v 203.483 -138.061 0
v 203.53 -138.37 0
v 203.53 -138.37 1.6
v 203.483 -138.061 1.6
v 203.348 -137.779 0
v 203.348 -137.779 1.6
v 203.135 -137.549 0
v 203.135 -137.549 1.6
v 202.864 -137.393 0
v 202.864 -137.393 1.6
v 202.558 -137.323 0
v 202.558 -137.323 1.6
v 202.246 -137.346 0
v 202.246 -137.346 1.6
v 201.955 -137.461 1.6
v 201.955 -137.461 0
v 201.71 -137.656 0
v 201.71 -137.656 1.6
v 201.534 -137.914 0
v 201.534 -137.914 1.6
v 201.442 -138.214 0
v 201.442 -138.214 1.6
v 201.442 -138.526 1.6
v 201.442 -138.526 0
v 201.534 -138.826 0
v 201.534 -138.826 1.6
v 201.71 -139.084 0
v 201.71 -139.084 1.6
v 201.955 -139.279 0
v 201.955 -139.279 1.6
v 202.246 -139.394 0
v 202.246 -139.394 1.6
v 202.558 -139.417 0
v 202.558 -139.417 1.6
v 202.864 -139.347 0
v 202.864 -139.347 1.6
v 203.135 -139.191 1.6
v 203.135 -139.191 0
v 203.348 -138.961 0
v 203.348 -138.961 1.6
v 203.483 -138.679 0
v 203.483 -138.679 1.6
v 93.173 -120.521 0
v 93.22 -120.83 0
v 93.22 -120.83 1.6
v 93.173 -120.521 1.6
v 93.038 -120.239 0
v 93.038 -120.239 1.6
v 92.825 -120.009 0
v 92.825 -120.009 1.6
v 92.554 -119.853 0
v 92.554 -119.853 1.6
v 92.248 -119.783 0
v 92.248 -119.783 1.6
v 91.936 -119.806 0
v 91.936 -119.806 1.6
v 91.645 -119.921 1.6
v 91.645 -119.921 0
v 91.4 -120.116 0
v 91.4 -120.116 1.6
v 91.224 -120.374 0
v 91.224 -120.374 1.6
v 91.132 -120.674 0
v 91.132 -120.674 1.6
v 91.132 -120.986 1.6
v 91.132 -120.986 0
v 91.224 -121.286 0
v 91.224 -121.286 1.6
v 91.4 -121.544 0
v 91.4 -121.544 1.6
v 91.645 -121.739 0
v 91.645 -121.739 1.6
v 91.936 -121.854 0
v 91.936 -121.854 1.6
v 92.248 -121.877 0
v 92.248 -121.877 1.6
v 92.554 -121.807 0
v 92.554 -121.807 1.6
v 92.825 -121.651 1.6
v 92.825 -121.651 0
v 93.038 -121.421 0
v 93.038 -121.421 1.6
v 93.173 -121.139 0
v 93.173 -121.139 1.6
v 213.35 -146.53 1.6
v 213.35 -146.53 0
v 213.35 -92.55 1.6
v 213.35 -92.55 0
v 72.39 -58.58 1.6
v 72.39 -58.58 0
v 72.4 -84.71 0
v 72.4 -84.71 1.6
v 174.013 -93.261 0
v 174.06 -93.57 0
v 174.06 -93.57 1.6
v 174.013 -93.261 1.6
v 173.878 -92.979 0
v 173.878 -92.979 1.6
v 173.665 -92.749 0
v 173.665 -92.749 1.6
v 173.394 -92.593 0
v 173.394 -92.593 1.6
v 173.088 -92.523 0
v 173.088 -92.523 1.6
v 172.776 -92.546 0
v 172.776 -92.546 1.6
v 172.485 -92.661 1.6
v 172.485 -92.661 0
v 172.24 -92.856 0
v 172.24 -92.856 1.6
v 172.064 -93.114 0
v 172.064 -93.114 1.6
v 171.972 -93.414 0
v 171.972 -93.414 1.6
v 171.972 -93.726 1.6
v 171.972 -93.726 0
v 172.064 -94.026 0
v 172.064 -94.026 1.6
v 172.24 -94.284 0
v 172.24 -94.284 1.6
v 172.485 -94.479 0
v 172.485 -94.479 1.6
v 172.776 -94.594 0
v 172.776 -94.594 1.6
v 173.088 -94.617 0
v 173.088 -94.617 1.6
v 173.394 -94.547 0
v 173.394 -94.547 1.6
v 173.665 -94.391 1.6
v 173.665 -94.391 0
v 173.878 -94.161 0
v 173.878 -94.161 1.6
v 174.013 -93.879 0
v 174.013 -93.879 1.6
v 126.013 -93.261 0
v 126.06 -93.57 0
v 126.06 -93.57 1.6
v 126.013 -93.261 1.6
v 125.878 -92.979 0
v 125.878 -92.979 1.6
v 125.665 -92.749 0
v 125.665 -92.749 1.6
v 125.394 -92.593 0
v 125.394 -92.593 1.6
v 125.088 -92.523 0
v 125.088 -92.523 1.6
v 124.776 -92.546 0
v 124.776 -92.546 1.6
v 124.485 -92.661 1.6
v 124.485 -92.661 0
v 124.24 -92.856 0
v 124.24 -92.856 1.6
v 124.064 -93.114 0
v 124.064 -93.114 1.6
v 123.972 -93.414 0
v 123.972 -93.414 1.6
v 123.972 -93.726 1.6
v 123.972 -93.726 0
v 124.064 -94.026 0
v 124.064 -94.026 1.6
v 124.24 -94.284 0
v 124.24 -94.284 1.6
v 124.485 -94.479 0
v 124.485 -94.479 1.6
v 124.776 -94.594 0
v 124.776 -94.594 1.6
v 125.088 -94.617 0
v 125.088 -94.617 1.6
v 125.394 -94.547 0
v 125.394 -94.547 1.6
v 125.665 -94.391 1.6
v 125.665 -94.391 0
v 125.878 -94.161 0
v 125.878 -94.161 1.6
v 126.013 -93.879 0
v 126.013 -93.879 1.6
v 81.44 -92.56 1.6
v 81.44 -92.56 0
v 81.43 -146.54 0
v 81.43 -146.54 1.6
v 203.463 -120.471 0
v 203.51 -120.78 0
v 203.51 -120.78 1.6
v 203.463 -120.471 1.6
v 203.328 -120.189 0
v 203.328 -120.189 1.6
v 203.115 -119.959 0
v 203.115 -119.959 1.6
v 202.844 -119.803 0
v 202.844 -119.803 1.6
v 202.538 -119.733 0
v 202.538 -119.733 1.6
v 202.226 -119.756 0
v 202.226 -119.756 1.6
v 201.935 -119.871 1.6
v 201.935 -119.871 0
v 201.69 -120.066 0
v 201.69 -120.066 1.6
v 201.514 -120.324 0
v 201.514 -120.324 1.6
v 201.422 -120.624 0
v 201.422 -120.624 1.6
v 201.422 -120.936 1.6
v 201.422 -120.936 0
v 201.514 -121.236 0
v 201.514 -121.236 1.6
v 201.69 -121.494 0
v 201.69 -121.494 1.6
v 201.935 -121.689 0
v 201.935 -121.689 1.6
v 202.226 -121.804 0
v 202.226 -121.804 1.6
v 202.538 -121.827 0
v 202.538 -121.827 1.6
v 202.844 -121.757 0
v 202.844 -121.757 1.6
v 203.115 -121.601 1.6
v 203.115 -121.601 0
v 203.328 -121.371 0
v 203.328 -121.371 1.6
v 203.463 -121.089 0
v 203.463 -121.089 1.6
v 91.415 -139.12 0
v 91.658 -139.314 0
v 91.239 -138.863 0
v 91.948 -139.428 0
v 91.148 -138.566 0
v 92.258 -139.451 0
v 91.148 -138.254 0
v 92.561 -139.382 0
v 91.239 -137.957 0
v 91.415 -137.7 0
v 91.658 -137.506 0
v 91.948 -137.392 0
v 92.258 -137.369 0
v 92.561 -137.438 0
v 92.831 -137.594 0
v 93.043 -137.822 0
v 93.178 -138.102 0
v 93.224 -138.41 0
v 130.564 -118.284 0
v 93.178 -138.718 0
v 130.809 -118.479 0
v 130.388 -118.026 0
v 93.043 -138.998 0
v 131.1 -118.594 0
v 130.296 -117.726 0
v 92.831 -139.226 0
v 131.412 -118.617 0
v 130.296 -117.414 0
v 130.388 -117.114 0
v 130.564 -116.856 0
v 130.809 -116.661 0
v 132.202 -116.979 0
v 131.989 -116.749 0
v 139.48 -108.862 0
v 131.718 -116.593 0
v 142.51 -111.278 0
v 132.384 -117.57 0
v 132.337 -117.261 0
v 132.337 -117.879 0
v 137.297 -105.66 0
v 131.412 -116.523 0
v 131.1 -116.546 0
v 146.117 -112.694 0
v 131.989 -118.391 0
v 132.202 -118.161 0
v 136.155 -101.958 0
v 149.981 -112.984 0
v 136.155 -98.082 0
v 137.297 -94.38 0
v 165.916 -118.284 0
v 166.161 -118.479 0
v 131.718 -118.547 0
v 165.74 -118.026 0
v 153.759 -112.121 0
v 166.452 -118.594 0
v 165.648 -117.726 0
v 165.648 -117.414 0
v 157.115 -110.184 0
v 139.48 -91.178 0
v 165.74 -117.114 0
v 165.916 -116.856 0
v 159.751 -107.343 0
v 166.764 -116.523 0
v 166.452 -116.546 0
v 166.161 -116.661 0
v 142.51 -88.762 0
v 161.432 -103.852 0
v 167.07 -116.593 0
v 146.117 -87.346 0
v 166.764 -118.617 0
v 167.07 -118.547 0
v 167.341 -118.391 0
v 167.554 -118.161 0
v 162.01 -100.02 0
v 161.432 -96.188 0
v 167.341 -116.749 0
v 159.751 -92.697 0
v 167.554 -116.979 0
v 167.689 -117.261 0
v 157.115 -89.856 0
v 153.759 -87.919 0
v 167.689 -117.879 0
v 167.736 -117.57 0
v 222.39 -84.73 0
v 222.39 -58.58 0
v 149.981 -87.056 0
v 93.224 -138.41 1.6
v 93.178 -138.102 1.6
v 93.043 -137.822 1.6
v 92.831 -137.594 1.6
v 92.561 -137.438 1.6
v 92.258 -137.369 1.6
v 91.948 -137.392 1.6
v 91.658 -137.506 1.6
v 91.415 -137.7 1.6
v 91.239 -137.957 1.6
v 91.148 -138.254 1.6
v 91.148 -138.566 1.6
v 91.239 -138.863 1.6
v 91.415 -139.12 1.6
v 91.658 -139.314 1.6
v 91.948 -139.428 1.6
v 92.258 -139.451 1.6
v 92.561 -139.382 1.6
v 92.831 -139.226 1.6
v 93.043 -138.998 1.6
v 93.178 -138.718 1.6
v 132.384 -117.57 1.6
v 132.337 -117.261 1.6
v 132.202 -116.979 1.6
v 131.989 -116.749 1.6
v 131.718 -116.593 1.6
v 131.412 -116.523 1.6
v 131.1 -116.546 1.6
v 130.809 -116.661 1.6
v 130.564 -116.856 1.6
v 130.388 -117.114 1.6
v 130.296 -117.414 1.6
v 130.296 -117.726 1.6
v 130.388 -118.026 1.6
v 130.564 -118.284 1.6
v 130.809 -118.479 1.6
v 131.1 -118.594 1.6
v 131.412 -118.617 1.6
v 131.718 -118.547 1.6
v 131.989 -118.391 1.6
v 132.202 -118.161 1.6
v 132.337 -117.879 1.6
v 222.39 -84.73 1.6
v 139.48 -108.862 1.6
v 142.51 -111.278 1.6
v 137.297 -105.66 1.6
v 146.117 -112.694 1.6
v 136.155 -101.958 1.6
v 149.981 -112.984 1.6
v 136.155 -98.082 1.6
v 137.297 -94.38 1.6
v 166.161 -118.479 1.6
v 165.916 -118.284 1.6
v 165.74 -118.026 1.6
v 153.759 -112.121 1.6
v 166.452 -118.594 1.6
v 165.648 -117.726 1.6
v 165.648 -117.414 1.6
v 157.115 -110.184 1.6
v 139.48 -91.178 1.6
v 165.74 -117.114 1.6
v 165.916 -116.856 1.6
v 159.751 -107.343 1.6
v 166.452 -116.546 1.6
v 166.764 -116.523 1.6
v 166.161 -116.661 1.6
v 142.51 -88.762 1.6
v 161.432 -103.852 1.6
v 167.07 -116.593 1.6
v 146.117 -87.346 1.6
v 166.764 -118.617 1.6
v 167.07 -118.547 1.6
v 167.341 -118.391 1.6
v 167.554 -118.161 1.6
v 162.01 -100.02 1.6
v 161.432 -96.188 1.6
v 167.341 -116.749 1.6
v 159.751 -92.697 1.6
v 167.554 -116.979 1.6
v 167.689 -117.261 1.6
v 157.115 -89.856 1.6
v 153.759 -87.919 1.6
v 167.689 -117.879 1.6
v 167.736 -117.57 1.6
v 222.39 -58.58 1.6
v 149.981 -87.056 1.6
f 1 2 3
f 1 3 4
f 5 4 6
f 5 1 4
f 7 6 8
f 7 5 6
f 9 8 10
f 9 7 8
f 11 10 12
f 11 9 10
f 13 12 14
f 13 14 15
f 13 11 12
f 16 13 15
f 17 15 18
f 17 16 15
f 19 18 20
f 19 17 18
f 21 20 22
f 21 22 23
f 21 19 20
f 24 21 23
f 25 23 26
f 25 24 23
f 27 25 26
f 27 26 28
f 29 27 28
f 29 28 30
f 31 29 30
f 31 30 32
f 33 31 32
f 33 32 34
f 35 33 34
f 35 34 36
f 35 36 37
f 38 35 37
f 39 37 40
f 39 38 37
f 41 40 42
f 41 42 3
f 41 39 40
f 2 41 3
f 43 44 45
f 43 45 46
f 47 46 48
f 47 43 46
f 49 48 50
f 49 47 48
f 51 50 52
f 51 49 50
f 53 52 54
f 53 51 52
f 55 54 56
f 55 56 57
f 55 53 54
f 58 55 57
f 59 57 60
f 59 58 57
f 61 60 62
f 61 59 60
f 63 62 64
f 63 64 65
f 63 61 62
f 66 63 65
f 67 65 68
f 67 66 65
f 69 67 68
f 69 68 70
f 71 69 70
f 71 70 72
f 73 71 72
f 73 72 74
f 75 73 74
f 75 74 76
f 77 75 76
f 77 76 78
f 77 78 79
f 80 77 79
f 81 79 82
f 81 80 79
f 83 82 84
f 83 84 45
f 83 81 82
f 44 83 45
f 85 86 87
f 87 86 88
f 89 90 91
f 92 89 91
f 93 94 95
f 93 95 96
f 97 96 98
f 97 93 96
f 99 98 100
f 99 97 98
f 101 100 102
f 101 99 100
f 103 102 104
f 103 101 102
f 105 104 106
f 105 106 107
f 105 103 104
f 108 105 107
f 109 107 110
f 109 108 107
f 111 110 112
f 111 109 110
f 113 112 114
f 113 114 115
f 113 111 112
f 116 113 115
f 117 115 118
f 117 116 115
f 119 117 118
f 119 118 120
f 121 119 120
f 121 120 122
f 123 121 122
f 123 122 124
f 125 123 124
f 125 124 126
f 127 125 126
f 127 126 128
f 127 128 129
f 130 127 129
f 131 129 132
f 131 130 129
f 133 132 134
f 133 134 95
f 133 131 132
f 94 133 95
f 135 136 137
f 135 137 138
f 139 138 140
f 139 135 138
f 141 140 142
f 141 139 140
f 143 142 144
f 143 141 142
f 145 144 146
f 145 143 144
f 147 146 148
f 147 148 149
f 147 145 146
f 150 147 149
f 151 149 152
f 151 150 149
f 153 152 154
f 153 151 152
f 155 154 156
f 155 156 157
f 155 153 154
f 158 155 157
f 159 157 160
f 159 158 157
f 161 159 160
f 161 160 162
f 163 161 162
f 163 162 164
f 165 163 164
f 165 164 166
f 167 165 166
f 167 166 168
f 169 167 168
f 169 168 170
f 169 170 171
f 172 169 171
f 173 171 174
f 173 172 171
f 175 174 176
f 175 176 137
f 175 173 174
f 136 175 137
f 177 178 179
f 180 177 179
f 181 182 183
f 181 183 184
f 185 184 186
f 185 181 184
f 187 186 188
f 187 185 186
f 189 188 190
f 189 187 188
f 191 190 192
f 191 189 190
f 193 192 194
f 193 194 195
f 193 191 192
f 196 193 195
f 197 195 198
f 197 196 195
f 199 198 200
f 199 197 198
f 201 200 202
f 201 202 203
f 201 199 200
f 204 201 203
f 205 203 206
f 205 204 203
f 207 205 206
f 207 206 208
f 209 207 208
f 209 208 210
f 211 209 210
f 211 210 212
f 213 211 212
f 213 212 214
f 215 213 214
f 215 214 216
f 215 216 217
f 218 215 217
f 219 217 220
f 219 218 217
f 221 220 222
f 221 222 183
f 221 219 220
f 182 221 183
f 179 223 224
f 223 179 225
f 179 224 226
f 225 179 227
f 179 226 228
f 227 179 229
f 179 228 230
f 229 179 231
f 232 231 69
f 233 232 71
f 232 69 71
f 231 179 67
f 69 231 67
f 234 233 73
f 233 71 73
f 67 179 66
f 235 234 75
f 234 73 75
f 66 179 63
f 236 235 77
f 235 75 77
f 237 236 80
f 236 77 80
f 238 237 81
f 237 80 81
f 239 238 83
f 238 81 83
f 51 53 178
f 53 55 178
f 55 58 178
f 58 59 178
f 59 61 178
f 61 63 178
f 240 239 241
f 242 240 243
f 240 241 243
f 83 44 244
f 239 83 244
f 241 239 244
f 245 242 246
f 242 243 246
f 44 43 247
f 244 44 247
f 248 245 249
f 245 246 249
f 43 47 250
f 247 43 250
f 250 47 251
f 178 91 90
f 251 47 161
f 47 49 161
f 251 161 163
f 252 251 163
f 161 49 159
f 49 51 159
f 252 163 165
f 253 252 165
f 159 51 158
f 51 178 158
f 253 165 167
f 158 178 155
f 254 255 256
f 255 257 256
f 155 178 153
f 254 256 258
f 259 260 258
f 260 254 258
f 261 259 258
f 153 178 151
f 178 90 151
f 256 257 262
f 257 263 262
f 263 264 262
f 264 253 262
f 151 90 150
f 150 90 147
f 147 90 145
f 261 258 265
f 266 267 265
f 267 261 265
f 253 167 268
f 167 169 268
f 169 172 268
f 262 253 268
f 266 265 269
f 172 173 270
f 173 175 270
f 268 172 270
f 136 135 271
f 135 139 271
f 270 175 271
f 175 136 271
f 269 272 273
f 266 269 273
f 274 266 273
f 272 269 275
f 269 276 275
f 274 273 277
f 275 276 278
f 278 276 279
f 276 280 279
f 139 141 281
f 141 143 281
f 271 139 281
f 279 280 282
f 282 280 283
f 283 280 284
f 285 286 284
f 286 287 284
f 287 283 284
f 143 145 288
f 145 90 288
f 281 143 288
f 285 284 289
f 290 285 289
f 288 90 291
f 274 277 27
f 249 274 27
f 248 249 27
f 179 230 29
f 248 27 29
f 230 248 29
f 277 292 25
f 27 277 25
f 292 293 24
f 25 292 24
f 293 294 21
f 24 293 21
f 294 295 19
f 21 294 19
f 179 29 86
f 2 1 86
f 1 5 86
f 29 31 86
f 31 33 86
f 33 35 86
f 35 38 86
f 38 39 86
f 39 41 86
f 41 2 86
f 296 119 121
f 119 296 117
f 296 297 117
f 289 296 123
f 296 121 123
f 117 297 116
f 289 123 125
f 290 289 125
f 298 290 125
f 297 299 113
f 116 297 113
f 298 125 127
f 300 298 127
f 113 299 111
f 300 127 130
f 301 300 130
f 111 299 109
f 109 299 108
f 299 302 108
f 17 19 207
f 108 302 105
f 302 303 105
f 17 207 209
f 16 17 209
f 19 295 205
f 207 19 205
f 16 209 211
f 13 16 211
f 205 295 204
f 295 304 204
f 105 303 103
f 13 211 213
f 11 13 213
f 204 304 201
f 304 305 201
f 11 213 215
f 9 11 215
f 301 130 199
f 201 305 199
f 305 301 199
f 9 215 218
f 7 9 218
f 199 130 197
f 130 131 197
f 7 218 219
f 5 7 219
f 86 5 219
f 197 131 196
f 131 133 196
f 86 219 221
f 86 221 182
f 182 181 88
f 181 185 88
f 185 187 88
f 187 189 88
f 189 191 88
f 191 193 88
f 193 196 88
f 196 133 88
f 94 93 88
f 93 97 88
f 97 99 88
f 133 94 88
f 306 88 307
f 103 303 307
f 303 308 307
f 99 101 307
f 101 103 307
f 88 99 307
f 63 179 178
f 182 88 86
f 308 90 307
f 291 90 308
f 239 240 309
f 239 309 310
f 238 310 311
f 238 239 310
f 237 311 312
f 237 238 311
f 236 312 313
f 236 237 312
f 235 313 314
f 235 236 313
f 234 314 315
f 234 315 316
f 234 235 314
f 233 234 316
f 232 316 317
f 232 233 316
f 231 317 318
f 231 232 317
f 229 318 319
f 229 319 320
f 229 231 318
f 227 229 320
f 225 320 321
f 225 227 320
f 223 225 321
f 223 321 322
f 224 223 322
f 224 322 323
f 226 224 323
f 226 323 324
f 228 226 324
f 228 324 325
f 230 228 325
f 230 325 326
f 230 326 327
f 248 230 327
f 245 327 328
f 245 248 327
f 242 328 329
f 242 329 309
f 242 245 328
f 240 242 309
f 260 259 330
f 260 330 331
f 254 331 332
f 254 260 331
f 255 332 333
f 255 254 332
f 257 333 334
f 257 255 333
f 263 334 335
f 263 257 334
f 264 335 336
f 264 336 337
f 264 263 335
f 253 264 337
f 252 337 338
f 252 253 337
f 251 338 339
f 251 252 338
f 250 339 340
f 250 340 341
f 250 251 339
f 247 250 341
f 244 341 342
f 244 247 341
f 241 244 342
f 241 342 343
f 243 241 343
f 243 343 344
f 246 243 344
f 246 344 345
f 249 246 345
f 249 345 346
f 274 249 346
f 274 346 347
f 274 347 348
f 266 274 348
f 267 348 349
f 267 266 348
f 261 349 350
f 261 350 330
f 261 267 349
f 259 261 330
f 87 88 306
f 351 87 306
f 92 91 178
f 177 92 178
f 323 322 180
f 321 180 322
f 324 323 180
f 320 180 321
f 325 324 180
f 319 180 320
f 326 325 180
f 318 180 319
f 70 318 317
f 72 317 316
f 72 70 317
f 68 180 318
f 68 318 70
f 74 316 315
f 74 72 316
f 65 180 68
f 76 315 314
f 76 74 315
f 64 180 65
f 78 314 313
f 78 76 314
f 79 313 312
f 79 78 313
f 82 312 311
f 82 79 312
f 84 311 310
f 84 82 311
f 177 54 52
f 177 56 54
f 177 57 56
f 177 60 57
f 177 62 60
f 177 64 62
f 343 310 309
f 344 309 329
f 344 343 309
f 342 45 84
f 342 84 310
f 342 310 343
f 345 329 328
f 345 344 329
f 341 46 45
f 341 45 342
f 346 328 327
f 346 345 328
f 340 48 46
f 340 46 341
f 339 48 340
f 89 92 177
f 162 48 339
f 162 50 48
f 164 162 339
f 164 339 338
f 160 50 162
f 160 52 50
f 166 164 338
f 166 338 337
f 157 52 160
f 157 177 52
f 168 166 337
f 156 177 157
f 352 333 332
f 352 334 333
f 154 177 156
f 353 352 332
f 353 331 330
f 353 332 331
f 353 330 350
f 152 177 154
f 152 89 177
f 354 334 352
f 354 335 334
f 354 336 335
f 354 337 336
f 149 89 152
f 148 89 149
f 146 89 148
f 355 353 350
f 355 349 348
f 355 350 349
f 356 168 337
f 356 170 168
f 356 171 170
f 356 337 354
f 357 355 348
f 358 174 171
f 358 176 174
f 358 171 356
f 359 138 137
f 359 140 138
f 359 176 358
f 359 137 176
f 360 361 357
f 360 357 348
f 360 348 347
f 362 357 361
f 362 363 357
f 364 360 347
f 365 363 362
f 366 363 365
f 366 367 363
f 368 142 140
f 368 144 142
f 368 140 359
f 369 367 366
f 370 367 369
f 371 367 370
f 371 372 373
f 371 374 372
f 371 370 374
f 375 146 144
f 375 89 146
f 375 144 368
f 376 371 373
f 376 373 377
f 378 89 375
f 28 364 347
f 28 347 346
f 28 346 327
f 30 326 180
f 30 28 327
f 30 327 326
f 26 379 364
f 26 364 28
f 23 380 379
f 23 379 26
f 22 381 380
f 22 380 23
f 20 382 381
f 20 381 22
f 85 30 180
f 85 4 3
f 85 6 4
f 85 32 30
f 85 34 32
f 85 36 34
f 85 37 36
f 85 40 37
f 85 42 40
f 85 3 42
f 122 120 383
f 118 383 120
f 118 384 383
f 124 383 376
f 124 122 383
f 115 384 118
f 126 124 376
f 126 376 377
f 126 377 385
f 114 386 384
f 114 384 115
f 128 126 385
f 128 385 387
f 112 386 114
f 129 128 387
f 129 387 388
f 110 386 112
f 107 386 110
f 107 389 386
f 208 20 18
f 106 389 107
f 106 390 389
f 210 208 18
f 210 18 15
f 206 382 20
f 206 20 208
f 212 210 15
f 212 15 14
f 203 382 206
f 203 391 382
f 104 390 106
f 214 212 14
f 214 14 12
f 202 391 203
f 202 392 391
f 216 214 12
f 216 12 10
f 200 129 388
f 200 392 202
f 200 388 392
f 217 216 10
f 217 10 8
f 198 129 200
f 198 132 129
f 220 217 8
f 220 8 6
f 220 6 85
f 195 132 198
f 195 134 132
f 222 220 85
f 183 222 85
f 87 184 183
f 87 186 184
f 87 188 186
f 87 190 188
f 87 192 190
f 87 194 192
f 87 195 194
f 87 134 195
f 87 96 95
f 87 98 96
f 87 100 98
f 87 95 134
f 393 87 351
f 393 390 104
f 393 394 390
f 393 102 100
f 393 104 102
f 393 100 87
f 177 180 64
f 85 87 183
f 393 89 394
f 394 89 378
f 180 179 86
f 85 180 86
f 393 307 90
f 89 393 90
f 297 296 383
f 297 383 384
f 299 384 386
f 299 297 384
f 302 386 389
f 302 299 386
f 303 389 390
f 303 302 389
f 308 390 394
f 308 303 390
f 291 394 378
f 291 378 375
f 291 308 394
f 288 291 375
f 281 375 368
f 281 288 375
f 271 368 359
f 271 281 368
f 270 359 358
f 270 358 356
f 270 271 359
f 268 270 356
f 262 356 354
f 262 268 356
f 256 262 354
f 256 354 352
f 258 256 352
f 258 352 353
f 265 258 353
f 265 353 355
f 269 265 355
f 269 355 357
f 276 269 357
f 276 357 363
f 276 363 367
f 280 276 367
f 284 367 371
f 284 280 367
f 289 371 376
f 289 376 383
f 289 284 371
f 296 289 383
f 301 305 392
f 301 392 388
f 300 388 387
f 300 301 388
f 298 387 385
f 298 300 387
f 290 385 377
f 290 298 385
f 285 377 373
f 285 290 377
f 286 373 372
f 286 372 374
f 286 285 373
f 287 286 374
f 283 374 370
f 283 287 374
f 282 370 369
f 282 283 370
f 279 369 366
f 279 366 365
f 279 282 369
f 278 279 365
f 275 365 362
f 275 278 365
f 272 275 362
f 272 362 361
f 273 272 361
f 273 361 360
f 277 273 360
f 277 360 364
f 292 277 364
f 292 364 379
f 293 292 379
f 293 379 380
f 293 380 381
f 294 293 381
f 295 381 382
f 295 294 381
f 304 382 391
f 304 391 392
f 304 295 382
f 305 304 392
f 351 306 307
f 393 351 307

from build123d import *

# Parameters (mm, degrees)
SKETCH1_R           = 13
SKETCH1_R_2         = 1.05
SKETCH1_R_3         = 1.044026492
BOSS_EXTRUDE1_DEPTH = 1.6


with BuildPart() as part:
    # Sketch1 → Boss-Extrude1 (new body)
    with BuildSketch(Plane.XY):
        Polygon((72.39, -58.58), (72.4, -84.71), (81.44, -92.56), (81.43, -146.54), (213.35, -146.53), (213.35, -92.55), (222.39, -84.73), (222.39, -58.58), align=None)
        with Locations((149.01, -100.02)):
            Circle(SKETCH1_R, mode=Mode.SUBTRACT)
        with Locations((202.46, -120.78)):
            Circle(SKETCH1_R_2, mode=Mode.SUBTRACT)
        with Locations((202.48, -138.37)):
            Circle(SKETCH1_R_2, mode=Mode.SUBTRACT)
        with Locations((92.18, -138.41)):
            Circle(SKETCH1_R_3, mode=Mode.SUBTRACT)
        with Locations((92.17, -120.83)):
            Circle(SKETCH1_R_2, mode=Mode.SUBTRACT)
        with Locations((131.334, -117.57)):
            Circle(SKETCH1_R_2, mode=Mode.SUBTRACT)
        with Locations((166.686, -117.57)):
            Circle(SKETCH1_R_2, mode=Mode.SUBTRACT)
        with Locations((173.01, -93.57)):
            Circle(SKETCH1_R_2, mode=Mode.SUBTRACT)
        with Locations((125.01, -93.57)):
            Circle(SKETCH1_R_2, mode=Mode.SUBTRACT)
    extrude(amount=BOSS_EXTRUDE1_DEPTH)


solid = part.part
